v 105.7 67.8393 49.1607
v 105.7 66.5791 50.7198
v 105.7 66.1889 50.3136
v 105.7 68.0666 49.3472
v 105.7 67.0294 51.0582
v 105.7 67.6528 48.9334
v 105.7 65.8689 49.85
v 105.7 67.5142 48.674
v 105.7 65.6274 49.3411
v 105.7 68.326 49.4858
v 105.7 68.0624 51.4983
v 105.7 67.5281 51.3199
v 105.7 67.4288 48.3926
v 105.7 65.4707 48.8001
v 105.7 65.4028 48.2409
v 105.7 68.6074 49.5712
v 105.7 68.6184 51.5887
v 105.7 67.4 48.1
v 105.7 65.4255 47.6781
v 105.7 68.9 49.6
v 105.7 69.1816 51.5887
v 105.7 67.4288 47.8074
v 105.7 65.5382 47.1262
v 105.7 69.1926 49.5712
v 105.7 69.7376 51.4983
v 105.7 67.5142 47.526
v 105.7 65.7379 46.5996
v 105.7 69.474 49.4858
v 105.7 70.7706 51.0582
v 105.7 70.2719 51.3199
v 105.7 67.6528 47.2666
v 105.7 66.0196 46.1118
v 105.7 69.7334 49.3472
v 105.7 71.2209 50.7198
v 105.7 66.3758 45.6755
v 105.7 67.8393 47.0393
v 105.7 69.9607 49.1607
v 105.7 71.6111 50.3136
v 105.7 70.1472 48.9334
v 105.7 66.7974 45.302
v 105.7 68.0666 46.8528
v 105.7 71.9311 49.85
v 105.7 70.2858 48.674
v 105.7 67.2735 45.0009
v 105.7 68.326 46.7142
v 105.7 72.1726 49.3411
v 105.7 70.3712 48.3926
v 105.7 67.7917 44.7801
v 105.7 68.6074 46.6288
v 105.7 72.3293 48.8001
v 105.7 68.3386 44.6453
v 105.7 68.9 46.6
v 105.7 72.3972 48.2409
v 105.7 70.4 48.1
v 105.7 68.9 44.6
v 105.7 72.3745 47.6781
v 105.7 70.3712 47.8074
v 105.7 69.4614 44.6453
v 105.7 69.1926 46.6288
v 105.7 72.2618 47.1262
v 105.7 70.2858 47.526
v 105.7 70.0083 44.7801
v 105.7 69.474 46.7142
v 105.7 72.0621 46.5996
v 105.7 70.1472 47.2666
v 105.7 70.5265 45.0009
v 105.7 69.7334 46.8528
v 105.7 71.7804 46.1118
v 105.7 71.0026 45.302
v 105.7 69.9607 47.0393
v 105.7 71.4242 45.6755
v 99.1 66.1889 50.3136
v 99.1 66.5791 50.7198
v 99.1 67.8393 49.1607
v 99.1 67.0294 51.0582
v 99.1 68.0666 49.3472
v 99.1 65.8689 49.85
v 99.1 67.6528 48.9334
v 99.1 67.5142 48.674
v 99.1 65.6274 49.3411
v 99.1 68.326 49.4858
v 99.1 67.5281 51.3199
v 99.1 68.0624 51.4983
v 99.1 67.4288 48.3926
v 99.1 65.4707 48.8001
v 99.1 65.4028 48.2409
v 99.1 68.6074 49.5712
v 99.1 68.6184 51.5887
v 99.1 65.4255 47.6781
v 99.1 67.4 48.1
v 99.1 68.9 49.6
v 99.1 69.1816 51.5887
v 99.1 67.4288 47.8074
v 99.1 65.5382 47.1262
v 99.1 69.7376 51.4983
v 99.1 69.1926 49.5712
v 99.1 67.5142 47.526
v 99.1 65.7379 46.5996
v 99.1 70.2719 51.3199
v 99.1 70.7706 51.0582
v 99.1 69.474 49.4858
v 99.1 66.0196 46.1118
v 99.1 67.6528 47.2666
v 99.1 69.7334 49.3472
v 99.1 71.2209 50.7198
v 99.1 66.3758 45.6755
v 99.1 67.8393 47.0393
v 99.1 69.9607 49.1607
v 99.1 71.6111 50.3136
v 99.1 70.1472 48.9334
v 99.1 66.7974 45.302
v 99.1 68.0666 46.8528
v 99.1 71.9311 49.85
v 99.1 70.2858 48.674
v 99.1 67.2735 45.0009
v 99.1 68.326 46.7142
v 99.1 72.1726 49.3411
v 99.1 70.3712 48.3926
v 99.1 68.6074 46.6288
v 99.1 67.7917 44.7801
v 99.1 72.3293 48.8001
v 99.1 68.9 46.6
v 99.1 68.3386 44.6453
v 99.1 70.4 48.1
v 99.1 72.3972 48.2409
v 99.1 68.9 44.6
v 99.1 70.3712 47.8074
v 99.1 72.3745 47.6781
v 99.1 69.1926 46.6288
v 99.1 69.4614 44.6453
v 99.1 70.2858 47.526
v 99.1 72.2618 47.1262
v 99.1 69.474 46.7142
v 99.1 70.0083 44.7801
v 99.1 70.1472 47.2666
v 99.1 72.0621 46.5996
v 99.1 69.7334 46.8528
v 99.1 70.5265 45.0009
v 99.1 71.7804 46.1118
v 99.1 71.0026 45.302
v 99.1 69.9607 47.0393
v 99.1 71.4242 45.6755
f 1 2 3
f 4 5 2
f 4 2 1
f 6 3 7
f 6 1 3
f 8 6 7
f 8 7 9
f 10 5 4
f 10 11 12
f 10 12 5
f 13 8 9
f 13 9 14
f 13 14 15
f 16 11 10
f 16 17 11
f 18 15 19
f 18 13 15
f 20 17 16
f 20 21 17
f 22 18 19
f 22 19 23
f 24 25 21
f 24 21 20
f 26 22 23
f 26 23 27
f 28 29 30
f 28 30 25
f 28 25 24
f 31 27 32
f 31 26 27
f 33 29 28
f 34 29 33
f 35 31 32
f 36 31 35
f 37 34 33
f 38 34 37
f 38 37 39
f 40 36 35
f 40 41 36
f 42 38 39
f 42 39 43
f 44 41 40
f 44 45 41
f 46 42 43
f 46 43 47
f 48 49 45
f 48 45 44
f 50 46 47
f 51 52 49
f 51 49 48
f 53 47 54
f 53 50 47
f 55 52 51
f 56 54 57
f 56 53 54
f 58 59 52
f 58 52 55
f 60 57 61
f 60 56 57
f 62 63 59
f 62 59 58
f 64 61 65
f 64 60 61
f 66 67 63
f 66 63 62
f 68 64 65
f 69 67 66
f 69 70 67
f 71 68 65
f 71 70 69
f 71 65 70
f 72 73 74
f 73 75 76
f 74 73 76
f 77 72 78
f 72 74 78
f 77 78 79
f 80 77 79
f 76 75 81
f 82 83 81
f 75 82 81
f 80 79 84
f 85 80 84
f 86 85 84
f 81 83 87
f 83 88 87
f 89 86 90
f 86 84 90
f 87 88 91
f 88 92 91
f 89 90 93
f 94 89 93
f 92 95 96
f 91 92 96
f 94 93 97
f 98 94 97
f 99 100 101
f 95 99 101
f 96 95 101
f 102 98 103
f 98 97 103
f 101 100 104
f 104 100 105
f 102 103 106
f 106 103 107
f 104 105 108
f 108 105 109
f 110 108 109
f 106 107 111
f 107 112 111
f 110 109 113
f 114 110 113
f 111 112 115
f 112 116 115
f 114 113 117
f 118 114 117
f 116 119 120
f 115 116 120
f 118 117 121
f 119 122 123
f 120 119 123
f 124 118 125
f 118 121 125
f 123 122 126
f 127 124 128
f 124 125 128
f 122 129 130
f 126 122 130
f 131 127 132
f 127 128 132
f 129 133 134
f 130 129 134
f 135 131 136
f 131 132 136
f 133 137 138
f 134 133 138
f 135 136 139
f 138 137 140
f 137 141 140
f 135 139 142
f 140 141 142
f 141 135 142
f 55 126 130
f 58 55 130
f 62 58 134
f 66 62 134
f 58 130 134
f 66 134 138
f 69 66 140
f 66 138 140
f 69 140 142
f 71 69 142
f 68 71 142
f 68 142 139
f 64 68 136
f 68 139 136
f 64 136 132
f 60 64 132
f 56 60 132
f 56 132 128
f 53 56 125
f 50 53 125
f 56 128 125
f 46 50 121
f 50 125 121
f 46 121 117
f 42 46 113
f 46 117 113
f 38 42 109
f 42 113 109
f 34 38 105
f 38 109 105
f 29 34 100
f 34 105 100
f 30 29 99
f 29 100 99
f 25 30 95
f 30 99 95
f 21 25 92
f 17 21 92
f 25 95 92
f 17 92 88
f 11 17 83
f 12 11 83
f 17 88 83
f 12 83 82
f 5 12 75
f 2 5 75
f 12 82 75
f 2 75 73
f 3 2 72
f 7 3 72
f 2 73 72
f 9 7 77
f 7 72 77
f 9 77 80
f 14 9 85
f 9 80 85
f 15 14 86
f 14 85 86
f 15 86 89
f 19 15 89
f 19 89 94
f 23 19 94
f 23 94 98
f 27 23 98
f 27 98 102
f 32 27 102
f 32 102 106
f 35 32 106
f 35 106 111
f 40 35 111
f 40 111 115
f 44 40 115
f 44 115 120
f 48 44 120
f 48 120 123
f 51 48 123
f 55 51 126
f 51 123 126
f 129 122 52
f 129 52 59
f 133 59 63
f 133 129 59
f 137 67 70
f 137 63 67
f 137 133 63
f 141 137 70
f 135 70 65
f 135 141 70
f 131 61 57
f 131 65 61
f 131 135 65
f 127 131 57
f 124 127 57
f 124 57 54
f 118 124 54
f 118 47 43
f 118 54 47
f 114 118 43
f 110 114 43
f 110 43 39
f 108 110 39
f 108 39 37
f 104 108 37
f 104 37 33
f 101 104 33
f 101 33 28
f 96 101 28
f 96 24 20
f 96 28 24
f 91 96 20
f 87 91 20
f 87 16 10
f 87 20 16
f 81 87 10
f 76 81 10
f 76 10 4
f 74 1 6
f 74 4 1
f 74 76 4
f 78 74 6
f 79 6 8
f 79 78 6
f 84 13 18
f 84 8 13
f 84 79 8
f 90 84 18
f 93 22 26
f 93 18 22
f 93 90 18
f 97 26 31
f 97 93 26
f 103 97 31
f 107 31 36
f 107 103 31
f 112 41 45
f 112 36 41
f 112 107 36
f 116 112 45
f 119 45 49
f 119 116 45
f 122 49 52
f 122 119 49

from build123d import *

# Parameters (mm, degrees)
CYLINDER178_R     = 1.5
CYLINDER178_DEPTH = 55
CYLINDER172_R     = 3.5
CYLINDER172_DEPTH = 6.6


with BuildPart() as cylinder178:
    # Cylinder178 → Cylinder178 (new body)
    with BuildSketch(Plane(origin=(92.7, 68.9, 48.1), x_dir=(0, 0, -1), z_dir=(1, 0, 0))):
        Circle(CYLINDER178_R)
    extrude(amount=CYLINDER178_DEPTH)


with BuildPart() as cut210:
    # Cylinder172 → Cylinder172 (new body)
    with BuildSketch(Plane(origin=(99.1, 68.9, 48.1), x_dir=(0, 0, -1), z_dir=(1, 0, 0))):
        Circle(CYLINDER172_R)
    extrude(amount=CYLINDER172_DEPTH)

    # Cut210: cut Cylinder178
    add(cylinder178.part, mode=Mode.SUBTRACT)


solid = cut210.part
